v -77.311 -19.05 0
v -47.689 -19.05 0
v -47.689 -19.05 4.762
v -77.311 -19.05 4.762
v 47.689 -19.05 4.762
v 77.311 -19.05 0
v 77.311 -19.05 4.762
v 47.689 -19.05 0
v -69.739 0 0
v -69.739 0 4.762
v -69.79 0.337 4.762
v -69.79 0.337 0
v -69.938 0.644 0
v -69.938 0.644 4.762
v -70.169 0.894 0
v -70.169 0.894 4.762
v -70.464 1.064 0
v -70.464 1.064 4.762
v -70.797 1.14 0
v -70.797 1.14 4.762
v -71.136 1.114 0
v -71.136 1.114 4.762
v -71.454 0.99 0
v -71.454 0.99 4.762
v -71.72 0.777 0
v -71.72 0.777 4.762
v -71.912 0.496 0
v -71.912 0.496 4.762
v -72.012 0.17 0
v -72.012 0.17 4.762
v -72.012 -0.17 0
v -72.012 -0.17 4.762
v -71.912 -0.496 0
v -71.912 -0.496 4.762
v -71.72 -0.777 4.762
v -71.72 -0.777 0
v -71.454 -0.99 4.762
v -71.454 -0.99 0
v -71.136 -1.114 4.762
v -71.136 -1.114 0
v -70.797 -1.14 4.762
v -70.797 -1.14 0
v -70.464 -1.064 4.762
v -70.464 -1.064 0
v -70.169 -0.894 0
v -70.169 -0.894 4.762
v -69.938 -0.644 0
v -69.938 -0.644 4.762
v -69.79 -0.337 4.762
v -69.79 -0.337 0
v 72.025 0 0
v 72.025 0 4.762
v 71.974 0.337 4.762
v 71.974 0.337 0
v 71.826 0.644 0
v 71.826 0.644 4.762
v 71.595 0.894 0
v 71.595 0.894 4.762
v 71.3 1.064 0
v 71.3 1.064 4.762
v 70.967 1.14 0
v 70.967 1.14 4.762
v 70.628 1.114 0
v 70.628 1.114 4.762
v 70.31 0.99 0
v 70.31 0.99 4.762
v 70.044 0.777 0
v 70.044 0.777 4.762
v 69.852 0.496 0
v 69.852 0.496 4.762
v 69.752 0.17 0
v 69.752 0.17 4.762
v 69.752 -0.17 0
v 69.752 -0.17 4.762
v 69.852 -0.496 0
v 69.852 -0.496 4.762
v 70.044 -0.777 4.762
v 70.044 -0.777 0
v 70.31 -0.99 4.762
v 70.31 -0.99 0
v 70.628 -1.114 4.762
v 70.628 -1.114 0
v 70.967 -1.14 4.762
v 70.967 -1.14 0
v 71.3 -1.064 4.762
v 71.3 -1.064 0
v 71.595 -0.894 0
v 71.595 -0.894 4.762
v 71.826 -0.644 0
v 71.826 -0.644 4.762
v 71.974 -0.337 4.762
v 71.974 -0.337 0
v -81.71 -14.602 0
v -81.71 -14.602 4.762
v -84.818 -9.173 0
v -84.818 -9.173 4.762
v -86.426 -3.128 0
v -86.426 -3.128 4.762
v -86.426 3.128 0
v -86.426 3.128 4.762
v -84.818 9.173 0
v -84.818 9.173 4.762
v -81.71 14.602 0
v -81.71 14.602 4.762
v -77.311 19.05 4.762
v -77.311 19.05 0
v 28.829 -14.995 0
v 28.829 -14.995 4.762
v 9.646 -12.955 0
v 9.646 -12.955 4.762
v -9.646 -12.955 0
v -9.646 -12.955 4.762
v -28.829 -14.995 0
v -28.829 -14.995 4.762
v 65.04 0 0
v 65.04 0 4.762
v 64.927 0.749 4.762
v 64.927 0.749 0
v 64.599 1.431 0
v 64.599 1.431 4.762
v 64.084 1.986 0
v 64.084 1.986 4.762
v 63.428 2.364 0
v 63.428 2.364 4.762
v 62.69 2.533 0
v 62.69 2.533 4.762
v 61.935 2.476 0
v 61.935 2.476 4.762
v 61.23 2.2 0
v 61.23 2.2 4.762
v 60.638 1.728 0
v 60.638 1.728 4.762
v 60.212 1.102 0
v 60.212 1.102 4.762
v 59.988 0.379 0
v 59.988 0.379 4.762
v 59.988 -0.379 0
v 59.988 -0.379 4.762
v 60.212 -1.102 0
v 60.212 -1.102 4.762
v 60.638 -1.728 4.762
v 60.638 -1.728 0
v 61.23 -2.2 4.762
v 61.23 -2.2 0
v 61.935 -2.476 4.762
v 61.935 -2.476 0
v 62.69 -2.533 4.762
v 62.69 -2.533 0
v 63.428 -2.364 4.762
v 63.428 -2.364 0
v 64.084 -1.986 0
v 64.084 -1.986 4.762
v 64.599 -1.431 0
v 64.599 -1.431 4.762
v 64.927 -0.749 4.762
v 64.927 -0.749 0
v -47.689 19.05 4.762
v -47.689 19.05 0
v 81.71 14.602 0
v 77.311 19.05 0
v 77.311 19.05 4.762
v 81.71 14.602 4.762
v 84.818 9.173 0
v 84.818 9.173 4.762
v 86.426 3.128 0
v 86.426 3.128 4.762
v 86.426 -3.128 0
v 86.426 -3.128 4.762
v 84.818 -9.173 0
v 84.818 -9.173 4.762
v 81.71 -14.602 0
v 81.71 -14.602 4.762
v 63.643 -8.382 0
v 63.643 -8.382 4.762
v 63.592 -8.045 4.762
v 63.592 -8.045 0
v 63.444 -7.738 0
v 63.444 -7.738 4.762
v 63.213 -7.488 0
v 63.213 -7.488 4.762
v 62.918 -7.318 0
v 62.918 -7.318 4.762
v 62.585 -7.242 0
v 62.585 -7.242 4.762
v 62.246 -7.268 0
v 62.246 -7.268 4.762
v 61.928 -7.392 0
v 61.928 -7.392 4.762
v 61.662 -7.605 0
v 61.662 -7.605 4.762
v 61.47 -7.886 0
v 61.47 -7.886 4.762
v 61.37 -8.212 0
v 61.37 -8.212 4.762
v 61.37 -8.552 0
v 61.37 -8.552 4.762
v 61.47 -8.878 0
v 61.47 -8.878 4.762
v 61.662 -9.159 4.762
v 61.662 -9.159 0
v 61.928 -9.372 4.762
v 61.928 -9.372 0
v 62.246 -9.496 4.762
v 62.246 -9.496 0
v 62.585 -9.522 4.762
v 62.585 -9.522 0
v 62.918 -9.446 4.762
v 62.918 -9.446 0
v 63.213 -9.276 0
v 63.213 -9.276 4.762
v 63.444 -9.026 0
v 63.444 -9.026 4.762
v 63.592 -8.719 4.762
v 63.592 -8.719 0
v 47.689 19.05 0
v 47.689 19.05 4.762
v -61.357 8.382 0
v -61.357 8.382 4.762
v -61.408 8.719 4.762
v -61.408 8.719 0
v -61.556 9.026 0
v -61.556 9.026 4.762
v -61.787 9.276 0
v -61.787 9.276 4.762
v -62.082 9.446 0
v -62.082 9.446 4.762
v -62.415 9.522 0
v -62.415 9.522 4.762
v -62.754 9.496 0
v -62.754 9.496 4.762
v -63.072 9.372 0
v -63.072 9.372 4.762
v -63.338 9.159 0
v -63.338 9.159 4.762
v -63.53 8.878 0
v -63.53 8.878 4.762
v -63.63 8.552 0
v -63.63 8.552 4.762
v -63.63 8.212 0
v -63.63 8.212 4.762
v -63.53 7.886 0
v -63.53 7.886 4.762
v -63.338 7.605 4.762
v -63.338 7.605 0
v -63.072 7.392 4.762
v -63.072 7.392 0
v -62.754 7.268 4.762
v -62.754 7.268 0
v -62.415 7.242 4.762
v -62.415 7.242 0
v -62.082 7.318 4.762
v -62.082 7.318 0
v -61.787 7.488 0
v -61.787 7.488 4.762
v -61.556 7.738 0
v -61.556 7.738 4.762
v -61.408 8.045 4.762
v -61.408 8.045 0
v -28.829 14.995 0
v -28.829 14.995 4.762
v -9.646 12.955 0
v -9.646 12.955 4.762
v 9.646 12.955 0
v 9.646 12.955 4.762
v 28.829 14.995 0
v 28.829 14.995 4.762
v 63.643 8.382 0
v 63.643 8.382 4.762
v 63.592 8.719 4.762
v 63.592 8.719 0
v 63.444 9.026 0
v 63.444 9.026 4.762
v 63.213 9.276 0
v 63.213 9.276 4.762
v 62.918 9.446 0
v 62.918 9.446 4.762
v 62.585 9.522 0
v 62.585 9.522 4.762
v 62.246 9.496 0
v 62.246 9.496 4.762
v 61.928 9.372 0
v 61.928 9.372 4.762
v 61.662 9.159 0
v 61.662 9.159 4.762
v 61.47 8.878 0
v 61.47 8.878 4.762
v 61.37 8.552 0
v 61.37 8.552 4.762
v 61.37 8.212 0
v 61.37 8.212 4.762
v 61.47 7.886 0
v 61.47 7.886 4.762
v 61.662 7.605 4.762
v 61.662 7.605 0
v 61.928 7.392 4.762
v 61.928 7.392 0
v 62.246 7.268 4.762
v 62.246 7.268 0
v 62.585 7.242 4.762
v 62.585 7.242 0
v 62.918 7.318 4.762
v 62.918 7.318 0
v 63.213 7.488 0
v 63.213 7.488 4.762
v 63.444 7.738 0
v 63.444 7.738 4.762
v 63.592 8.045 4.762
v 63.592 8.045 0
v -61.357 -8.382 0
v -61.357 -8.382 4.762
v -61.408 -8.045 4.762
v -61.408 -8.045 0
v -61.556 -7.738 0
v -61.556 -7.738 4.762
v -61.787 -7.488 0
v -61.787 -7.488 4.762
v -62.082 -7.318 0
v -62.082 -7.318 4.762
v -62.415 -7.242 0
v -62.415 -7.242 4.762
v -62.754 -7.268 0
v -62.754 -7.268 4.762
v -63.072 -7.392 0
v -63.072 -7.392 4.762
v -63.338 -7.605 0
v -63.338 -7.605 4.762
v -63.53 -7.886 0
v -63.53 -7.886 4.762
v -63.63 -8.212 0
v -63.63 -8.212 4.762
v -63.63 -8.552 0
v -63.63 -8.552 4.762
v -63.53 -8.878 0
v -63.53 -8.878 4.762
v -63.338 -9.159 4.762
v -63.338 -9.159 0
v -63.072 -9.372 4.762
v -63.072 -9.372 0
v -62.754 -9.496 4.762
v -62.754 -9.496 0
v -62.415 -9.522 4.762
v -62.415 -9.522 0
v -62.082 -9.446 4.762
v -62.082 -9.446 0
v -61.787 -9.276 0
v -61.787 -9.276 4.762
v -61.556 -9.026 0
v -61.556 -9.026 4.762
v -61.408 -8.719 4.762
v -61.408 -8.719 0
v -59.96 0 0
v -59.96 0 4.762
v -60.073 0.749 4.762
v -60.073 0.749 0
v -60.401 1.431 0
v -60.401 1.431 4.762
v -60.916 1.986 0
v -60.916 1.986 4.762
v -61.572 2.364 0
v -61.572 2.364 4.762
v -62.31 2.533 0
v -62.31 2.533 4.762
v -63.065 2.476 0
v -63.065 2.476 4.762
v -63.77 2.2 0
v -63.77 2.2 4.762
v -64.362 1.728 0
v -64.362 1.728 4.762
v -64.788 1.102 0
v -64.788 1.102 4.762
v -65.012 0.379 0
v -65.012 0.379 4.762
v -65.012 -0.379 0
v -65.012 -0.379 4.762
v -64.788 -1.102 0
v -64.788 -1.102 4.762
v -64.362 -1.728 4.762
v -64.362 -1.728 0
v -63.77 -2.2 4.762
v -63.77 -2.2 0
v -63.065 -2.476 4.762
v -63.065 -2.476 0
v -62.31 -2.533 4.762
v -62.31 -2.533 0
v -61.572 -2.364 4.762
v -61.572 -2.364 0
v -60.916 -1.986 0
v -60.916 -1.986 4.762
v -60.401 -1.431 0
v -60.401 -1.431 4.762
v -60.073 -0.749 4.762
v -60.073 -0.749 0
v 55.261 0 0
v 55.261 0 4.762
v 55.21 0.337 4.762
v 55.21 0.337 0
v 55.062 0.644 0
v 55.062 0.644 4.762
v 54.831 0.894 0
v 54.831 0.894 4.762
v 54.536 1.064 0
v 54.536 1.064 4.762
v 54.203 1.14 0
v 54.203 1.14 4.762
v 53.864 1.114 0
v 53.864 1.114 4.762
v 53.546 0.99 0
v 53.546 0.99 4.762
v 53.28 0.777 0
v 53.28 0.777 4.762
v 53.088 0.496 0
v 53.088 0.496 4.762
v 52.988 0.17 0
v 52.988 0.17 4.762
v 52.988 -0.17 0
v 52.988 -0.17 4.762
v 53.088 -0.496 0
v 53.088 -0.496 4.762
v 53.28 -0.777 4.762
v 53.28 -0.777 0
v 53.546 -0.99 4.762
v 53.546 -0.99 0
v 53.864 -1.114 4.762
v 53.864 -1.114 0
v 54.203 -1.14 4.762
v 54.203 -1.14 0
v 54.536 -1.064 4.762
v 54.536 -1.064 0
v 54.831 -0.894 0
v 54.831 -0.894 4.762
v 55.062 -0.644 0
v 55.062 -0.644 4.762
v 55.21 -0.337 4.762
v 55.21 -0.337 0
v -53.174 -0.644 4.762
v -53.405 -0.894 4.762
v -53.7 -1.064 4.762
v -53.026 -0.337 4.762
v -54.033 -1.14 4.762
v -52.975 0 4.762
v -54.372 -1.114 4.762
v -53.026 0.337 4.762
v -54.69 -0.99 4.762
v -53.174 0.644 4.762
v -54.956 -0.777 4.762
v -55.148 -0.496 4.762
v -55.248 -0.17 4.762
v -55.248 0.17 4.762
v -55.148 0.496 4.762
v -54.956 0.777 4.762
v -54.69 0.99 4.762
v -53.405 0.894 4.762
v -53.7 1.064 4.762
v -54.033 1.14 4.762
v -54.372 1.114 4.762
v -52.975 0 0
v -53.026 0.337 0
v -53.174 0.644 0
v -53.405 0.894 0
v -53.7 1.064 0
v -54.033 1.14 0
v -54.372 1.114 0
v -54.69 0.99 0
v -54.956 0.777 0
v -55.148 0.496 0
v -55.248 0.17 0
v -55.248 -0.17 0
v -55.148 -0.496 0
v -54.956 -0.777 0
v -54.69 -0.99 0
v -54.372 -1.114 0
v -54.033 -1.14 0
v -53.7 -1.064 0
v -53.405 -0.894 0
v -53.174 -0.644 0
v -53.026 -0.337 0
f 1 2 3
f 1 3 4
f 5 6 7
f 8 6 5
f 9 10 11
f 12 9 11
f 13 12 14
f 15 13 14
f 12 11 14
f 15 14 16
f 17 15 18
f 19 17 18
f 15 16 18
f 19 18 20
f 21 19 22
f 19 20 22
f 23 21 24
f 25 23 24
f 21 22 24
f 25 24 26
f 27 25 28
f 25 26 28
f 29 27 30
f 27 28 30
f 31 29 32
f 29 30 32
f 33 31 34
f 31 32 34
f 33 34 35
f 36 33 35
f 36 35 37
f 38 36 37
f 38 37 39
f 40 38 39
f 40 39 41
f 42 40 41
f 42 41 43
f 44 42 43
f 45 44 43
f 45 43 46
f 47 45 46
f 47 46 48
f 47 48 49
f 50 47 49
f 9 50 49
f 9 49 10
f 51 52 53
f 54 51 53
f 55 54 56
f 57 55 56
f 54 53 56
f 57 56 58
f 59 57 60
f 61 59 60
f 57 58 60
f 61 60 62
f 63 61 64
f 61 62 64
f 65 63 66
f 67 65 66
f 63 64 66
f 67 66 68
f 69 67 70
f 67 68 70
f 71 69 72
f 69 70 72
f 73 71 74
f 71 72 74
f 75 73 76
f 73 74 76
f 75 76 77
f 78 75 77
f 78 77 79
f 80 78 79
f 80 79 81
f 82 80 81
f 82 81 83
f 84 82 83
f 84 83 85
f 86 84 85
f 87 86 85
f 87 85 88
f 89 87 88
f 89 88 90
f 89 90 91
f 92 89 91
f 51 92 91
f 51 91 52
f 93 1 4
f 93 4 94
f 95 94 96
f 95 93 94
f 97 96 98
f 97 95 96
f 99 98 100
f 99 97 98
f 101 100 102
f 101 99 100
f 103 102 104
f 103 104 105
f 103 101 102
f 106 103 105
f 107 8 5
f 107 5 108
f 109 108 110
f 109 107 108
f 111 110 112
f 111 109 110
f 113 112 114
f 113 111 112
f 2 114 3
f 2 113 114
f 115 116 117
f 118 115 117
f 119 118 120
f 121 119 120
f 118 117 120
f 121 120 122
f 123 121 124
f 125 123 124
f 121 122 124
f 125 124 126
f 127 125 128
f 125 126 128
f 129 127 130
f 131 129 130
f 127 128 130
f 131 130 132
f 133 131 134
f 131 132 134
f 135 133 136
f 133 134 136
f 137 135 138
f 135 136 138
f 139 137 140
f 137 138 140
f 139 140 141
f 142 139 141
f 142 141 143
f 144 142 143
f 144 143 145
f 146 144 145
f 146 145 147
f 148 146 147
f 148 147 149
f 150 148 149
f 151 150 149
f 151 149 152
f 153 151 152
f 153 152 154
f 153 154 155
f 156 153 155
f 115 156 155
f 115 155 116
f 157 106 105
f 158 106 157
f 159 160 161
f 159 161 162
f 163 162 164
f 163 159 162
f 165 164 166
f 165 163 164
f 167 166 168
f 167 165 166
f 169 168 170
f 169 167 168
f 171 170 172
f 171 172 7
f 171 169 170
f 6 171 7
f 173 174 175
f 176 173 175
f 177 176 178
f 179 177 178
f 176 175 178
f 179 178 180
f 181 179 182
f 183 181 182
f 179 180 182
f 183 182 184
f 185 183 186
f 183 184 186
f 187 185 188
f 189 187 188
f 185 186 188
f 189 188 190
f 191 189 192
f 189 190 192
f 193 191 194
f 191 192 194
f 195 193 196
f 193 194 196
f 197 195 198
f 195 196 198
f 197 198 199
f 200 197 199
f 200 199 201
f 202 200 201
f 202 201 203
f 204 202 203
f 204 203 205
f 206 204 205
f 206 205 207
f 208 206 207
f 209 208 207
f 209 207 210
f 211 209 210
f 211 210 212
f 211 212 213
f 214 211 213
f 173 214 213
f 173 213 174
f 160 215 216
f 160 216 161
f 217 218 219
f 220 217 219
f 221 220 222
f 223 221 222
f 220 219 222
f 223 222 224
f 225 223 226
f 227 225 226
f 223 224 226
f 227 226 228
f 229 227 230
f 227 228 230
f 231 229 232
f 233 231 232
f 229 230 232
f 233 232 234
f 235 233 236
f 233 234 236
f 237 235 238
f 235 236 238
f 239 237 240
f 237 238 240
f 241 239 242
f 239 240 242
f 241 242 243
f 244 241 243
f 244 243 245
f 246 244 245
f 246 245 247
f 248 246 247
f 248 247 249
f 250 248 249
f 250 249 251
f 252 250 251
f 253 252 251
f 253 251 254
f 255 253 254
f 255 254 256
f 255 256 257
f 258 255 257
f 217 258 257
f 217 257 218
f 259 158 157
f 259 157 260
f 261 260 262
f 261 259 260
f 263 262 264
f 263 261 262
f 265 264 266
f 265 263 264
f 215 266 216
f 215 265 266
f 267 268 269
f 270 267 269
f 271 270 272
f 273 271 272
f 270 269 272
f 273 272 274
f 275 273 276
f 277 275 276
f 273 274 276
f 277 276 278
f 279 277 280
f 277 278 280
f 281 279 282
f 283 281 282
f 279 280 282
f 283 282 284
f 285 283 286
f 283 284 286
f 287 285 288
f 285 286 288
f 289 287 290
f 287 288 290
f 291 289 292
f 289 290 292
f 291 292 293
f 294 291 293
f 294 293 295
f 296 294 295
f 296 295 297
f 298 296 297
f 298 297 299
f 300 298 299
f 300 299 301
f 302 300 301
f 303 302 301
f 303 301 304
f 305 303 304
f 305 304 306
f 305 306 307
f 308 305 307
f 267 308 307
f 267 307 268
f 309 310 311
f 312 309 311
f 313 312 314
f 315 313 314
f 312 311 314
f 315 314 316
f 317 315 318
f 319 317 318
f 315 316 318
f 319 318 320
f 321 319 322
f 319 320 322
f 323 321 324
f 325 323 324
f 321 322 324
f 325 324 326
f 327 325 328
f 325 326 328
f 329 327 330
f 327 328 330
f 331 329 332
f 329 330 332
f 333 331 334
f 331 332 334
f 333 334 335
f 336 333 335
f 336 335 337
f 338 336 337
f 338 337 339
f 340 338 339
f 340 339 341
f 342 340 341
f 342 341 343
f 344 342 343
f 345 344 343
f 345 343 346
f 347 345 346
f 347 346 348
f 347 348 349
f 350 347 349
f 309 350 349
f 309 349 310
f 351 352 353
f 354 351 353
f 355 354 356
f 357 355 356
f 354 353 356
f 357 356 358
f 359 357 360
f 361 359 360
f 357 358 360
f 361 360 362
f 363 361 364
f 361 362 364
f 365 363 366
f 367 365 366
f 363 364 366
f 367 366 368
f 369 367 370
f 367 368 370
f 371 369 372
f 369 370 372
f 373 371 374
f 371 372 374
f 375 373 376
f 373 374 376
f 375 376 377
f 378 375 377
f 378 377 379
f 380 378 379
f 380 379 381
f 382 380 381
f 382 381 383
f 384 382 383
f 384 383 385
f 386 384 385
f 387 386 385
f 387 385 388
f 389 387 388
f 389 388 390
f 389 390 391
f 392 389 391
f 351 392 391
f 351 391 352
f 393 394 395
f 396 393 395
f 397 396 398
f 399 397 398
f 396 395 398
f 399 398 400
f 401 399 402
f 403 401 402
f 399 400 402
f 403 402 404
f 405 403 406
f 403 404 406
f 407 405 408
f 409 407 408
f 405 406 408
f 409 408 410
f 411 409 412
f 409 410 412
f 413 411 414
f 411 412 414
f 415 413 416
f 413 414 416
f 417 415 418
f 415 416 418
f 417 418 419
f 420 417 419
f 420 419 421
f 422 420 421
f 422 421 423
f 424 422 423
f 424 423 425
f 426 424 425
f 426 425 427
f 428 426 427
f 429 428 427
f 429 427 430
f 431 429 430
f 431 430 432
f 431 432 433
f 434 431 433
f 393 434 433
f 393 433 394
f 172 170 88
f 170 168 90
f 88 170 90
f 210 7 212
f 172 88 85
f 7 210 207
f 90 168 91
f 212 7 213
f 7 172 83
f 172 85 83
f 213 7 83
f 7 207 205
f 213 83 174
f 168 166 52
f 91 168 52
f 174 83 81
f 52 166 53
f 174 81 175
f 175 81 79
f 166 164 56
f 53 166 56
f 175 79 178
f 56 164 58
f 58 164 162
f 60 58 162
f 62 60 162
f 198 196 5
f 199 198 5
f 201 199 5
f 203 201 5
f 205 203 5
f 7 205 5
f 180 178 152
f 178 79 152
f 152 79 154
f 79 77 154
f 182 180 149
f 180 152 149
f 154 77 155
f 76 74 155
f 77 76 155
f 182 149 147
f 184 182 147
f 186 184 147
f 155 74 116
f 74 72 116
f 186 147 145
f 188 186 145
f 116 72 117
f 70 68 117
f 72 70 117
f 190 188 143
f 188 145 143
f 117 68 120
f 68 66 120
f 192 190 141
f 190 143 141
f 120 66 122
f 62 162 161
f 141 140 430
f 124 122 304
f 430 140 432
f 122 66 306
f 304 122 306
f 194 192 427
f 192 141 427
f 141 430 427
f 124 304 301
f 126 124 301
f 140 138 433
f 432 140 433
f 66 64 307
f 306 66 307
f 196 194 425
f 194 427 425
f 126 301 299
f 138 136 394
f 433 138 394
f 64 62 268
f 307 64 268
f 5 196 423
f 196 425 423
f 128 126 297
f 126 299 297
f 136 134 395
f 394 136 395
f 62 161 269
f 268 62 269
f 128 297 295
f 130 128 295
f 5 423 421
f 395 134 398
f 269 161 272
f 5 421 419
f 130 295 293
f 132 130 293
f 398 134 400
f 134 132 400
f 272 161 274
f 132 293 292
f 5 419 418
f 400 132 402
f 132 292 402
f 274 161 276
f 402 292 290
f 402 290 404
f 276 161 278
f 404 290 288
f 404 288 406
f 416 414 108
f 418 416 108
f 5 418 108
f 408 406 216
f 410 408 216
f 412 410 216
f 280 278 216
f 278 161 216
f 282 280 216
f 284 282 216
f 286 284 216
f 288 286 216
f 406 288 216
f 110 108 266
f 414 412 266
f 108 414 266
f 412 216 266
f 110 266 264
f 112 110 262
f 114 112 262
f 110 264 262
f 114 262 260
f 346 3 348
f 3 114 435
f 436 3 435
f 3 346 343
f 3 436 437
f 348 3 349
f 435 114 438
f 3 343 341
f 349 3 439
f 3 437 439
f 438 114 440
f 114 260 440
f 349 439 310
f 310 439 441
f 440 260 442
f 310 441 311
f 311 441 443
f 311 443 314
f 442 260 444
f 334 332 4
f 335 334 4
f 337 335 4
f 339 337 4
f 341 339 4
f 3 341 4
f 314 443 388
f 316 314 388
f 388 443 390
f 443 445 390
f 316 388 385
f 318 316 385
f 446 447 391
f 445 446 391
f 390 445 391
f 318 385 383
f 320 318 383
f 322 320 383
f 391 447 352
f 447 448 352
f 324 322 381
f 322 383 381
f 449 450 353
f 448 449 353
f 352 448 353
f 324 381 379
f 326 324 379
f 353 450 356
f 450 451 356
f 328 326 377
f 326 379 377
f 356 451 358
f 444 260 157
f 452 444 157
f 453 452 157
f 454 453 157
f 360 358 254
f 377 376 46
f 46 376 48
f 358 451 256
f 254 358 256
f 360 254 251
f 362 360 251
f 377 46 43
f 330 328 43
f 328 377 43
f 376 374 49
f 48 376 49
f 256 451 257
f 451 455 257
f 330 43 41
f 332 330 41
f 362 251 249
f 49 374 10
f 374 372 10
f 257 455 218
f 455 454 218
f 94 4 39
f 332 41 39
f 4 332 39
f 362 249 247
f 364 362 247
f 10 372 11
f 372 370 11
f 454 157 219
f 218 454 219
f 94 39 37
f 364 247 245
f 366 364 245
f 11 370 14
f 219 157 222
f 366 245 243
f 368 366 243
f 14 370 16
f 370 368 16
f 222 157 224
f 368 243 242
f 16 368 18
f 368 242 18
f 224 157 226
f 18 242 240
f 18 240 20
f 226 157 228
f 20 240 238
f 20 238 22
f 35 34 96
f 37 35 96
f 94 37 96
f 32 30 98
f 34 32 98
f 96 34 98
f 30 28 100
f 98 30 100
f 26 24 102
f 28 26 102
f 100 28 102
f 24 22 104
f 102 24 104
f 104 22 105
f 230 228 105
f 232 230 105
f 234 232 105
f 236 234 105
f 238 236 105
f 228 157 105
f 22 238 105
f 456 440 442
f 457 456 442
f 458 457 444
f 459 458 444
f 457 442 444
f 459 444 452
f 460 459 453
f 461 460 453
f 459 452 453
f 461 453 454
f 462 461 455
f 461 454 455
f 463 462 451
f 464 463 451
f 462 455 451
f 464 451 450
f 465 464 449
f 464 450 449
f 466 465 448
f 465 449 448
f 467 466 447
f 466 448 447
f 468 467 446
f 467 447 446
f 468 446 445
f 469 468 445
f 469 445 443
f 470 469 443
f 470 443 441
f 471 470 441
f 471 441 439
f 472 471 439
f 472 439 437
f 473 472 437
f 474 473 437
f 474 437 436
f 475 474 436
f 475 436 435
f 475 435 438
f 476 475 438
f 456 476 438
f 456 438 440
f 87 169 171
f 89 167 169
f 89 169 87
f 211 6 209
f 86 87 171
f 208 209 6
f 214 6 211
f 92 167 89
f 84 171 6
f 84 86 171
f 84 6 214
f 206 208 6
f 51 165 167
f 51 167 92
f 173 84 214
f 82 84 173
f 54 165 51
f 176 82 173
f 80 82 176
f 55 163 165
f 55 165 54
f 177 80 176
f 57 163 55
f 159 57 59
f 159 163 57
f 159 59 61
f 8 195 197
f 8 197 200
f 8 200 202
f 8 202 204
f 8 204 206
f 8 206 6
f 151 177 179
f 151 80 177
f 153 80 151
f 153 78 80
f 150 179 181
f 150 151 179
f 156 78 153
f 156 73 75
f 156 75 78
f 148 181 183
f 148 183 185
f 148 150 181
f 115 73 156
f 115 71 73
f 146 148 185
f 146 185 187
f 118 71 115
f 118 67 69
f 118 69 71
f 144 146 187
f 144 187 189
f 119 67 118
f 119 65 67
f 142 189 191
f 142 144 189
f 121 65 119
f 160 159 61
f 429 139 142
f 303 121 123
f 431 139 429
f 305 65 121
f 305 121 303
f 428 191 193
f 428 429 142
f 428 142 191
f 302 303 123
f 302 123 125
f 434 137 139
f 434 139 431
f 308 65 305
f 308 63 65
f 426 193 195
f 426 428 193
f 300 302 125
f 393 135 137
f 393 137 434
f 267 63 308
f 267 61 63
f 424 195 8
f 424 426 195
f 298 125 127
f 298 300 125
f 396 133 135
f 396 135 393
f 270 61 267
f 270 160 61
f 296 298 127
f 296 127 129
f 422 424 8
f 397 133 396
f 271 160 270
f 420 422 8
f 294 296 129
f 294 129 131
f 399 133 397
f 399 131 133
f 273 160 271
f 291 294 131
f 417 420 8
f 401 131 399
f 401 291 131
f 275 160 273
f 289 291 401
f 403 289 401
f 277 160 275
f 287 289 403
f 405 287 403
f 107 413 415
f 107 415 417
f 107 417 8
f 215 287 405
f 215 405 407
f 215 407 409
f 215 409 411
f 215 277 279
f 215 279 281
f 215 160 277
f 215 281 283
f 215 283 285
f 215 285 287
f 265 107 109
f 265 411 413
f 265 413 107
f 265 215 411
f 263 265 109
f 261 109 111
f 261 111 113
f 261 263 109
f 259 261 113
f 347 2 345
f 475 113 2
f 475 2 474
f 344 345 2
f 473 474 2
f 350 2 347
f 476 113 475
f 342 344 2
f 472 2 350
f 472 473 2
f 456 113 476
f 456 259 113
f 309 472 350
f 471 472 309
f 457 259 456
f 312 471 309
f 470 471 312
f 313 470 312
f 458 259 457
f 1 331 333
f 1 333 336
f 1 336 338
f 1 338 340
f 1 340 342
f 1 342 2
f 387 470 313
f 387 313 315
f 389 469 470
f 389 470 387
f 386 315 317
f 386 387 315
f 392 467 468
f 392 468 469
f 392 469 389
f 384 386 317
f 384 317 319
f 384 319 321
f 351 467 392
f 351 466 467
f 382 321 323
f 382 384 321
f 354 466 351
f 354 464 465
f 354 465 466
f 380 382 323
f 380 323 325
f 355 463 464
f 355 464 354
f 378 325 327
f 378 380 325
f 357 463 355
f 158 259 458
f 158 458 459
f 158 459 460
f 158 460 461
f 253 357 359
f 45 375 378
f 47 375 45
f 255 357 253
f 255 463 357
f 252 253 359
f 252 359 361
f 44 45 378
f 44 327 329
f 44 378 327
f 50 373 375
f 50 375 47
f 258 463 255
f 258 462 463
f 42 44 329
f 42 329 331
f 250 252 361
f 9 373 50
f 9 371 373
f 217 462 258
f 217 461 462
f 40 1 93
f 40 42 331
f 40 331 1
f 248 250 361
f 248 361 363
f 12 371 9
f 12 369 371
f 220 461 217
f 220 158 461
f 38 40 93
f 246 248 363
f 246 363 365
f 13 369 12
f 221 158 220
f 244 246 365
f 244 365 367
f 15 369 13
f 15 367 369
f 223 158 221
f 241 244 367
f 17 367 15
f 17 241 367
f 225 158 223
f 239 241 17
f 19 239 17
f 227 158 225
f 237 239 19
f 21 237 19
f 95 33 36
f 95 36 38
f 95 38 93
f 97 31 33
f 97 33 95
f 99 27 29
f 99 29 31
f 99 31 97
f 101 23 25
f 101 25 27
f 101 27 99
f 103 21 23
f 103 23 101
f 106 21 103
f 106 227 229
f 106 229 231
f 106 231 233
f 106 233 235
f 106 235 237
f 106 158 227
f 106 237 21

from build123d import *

# Parameters (mm, degrees)
BOSS_EXTRUDE1_DEPTH = 4.7625
SKETCH2_R           = 2.54
SKETCH2_R_2         = 1.143
CUT_EXTRUDE1_DEPTH  = 89.827590344


with BuildPart() as part:
    # Sketch1 → Boss-Extrude1 (new body)
    with BuildSketch(Plane.XY):
        with BuildLine():
            Line((-77.310617813, 19.05), (-47.689382187, 19.05))
            ThreePointArc((-47.689382187, 19.05), (0, 12.7), (47.689382187, 19.05))
            Line((47.689382187, 19.05), (77.310617813, 19.05))
            ThreePointArc((77.310617813, 19.05), (86.63, 0), (77.310617813, -19.05))
            Line((77.310617813, -19.05), (47.689382187, -19.05))
            ThreePointArc((47.689382187, -19.05), (0, -12.7), (-47.689382187, -19.05))
            Line((-47.689382187, -19.05), (-77.310617813, -19.05))
            ThreePointArc((-77.310617813, -19.05), (-86.63, 0), (-77.310617813, 19.05))
        make_face()
    extrude(amount=BOSS_EXTRUDE1_DEPTH)

    # Sketch2 → Cut-Extrude1 (cut, through all)
    with BuildSketch(Plane.XY.offset(4.7625)):
        with Locations((-62.5, 0)):
            Circle(SKETCH2_R)
        with Locations((-54.118, 0)):
            Circle(SKETCH2_R_2)
        with Locations((-62.5, -8.382)):
            Circle(SKETCH2_R_2)
        with Locations((-70.882, 0)):
            Circle(SKETCH2_R_2)
        with Locations((-62.5, 8.382)):
            Circle(SKETCH2_R_2)
        with Locations((62.5, 0)):
            Circle(SKETCH2_R)
        with Locations((70.882, 0)):
            Circle(SKETCH2_R_2)
        with Locations((62.5, -8.382)):
            Circle(SKETCH2_R_2)
        with Locations((54.118, 0)):
            Circle(SKETCH2_R_2)
        with Locations((62.5, 8.382)):
            Circle(SKETCH2_R_2)
    extrude(amount=-CUT_EXTRUDE1_DEPTH, mode=Mode.SUBTRACT)


solid = part.part
